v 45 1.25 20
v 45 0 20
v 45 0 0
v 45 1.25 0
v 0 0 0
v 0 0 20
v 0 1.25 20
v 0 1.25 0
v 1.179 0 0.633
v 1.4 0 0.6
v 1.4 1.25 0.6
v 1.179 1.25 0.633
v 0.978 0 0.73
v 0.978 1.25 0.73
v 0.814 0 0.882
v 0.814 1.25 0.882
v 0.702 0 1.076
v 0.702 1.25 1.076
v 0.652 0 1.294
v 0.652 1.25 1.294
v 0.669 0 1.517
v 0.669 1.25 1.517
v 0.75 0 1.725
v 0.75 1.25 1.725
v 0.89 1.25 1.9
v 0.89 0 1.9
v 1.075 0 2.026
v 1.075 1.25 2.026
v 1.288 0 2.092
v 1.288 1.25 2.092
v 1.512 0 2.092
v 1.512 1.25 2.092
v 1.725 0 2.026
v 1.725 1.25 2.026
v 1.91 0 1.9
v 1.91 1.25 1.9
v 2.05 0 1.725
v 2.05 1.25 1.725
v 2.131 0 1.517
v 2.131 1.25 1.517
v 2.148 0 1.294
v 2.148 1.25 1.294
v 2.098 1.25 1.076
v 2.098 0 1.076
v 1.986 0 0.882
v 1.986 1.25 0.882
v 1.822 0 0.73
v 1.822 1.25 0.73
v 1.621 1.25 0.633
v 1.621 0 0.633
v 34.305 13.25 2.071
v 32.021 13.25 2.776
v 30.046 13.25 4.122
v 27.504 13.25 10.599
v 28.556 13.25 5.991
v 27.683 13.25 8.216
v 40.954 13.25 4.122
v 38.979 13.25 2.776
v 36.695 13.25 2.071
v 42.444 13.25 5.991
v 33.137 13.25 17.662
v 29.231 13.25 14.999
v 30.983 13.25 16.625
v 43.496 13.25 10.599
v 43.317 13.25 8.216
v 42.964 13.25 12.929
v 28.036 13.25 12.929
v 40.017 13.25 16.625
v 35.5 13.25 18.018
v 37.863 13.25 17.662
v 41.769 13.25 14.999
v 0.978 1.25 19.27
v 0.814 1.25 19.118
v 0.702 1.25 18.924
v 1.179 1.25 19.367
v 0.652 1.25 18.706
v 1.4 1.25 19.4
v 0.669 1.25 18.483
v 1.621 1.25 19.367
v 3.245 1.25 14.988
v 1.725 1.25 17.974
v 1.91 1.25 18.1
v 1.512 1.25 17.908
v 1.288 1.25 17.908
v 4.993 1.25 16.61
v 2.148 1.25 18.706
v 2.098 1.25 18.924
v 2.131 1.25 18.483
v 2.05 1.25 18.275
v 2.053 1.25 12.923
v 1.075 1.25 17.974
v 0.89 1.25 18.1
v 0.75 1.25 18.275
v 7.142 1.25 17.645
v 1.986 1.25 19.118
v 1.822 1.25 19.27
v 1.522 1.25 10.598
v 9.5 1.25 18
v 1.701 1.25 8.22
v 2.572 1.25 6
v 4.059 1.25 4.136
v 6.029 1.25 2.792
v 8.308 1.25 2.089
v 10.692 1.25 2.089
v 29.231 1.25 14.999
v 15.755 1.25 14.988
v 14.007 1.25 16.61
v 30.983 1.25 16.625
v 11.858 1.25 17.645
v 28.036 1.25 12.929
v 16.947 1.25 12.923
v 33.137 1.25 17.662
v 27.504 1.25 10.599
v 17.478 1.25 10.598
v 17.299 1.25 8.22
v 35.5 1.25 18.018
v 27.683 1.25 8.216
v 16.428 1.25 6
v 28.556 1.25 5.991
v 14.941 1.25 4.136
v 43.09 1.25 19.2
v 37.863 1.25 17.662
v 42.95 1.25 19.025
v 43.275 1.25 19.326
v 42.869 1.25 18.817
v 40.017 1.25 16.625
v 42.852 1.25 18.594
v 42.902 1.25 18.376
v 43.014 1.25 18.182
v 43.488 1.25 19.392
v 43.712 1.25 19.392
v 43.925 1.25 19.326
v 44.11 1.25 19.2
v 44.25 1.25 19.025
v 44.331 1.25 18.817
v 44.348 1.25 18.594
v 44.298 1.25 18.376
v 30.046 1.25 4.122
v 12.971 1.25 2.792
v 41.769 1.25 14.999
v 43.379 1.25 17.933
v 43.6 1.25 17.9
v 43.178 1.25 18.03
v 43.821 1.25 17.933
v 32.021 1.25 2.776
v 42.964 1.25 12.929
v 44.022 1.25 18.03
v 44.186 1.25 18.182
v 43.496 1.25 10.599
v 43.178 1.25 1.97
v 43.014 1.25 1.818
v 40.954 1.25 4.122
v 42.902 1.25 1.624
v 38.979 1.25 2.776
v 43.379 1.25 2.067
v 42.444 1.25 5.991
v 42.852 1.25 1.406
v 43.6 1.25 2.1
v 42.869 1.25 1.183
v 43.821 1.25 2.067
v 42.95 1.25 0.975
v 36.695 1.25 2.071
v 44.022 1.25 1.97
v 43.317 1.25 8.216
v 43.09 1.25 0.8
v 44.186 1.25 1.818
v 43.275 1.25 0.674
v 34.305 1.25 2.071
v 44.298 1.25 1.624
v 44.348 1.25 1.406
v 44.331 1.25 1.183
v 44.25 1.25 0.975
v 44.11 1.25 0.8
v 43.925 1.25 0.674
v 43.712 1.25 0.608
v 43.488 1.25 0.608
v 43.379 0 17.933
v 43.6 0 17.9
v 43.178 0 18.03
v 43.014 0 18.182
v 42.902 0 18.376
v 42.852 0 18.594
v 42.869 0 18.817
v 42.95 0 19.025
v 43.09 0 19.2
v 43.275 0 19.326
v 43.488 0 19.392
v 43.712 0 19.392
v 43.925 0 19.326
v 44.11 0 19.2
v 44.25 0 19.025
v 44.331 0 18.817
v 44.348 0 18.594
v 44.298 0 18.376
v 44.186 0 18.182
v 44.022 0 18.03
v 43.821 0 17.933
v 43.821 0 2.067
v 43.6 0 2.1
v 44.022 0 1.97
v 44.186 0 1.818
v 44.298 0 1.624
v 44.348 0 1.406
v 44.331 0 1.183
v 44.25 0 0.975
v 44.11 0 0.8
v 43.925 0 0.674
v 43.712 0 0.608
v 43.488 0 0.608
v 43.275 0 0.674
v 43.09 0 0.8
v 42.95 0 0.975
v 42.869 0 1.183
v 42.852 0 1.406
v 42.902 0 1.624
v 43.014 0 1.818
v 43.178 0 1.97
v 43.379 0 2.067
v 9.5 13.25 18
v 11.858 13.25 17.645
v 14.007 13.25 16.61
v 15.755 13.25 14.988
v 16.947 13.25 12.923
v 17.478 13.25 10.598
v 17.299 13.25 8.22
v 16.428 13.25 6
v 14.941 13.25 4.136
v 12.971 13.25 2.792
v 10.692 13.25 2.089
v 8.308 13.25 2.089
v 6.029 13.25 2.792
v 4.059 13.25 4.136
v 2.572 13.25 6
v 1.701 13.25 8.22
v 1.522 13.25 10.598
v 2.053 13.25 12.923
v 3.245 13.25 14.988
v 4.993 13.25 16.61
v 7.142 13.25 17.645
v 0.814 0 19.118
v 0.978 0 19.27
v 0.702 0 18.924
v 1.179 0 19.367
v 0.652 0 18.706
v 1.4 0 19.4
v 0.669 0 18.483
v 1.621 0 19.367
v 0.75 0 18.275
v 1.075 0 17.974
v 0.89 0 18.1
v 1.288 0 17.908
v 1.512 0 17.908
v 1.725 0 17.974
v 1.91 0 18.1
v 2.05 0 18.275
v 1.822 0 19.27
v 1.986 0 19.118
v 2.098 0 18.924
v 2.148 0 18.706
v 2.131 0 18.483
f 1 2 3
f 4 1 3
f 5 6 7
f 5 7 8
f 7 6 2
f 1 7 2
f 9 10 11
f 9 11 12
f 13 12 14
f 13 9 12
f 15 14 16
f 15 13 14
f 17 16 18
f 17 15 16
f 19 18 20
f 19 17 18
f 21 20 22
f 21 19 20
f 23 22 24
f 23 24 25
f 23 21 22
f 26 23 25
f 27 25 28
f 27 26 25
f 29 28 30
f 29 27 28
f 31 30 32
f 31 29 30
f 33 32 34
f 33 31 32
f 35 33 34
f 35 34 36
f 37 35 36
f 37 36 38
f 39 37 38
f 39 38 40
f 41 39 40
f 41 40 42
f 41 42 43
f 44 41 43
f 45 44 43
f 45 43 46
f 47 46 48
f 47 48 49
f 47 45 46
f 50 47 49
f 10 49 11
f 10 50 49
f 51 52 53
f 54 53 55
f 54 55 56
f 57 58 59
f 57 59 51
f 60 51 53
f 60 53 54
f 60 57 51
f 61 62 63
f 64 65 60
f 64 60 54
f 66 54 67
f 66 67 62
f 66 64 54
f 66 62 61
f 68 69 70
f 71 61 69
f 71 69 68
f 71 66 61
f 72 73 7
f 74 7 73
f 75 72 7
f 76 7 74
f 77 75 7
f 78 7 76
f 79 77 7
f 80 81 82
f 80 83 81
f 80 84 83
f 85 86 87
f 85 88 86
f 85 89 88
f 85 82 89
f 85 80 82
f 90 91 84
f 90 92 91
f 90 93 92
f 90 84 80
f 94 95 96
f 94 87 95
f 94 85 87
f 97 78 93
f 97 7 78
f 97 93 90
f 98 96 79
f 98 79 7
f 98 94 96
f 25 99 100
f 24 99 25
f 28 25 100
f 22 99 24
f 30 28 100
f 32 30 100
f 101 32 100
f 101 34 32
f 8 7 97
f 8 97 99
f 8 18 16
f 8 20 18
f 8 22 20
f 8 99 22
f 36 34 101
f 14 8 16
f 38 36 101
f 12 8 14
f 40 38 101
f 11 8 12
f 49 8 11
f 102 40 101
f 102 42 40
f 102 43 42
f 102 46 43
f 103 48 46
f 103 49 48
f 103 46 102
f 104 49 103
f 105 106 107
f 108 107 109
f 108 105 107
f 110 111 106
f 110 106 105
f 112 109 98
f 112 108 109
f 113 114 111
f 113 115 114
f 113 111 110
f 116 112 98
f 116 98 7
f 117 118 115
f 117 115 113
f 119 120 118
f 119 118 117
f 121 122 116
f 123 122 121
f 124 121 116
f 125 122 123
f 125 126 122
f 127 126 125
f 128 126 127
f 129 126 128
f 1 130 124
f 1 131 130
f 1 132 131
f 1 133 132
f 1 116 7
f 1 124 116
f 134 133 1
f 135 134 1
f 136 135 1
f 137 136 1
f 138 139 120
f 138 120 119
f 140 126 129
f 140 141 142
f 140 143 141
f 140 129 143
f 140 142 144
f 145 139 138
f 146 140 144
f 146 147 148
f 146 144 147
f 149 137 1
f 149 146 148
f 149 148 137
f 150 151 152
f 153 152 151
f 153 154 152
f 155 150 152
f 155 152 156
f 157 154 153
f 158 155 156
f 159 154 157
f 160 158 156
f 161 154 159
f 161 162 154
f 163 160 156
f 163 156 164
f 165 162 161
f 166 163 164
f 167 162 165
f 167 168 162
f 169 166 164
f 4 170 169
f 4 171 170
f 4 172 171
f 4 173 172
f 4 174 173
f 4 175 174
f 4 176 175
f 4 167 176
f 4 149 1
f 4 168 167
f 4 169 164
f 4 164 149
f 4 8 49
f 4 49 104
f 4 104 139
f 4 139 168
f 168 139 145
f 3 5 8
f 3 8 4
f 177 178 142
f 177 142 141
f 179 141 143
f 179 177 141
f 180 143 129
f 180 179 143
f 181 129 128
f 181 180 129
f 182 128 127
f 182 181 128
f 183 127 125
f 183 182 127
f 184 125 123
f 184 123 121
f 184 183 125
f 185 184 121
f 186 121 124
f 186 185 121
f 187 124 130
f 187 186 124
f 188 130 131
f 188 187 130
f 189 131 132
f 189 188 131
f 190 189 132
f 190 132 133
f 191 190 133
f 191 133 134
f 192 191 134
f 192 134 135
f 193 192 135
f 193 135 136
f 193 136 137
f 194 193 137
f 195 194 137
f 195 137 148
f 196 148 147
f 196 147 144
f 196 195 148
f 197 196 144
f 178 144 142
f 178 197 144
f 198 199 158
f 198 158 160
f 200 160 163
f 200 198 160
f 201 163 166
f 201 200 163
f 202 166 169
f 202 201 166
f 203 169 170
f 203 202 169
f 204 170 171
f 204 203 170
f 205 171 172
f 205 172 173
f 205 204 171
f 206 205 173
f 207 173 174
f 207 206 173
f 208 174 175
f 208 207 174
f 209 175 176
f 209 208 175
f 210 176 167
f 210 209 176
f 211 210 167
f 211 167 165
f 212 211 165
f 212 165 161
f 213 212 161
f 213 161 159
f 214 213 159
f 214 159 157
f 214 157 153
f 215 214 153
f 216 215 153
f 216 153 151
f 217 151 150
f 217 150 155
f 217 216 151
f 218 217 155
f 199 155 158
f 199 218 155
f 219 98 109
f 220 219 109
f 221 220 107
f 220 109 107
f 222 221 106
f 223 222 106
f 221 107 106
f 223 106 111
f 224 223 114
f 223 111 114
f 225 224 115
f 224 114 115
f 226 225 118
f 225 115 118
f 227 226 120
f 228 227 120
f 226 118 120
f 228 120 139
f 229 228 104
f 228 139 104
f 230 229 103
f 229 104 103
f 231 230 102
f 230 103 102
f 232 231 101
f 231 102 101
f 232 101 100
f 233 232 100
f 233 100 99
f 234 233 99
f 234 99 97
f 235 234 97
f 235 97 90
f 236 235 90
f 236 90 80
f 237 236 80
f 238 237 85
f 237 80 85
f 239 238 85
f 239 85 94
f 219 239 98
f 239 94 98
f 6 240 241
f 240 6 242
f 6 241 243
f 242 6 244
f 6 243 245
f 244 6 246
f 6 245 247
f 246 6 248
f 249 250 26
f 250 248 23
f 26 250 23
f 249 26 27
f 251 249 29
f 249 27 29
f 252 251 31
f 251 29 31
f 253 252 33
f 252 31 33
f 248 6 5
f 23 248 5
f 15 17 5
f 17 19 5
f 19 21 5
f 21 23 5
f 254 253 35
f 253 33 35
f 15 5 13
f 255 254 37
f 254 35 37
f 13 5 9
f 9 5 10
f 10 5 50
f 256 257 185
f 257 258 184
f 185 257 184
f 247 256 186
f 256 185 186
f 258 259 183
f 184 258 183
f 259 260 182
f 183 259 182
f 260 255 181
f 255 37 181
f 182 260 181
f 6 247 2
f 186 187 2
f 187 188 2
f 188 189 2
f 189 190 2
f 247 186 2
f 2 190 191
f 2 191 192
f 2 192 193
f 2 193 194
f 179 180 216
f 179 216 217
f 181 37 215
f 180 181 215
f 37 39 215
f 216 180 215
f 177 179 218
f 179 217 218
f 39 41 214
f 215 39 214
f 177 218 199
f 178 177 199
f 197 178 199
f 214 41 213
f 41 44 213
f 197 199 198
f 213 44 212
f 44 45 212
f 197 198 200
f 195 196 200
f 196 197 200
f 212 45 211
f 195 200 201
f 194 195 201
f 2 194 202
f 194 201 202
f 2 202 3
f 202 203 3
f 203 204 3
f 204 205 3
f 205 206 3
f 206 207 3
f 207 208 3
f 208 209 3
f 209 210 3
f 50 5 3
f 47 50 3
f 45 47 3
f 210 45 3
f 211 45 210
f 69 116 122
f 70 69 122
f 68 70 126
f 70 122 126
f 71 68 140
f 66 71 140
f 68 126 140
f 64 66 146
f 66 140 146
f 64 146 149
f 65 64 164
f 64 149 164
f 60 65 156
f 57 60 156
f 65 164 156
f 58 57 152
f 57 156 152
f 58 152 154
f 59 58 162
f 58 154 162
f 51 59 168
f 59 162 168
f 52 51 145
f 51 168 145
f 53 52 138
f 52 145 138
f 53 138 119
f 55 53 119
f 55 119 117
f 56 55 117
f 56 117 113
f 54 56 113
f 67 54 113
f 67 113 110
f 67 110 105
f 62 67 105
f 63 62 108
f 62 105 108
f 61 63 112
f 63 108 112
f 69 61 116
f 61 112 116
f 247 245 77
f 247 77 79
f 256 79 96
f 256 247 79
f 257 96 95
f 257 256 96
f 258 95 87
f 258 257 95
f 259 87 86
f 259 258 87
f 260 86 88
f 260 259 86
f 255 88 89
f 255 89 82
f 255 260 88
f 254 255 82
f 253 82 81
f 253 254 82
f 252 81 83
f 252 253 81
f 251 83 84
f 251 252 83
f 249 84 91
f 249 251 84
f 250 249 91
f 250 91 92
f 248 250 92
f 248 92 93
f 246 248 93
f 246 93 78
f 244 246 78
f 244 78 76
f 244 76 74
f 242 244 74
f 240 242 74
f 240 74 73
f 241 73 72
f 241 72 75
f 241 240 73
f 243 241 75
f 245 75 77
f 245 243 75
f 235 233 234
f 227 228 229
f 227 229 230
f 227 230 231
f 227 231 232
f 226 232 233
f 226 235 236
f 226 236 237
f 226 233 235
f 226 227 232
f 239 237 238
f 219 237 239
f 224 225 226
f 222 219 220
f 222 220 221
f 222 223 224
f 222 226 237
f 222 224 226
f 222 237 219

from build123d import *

# Parameters (mm, degrees)
SKETCH1_W           = 45
SKETCH1_H           = 20
SKETCH1_R           = 0.75
BOSS_EXTRUDE1_DEPTH = 1.25
SKETCH3_R           = 8
BOSS_EXTRUDE2_DEPTH = 12
SKETCH4_R           = 8.018104591
BOSS_EXTRUDE3_DEPTH = 12


with BuildPart() as part:
    # Sketch1 → Boss-Extrude1 (new body)
    with BuildSketch(Plane(origin=(0, 0, 0), x_dir=(1, 0, 0), z_dir=(0, 1, 0))):
        with Locations((22.5, -10)):
            Rectangle(SKETCH1_W, SKETCH1_H)
        with Locations(Location((1.4, -18.65, 0), (0, 0, 270))):
            Circle(SKETCH1_R, mode=Mode.SUBTRACT)
        with Locations(Location((1.4, -1.35, 0), (0, 0, 90))):
            Circle(SKETCH1_R, mode=Mode.SUBTRACT)
        with Locations(Location((43.6, -18.65, 0), (0, 0, 90))):
            Circle(SKETCH1_R, mode=Mode.SUBTRACT)
        with Locations(Location((43.6, -1.35, 0), (0, 0, 270))):
            Circle(SKETCH1_R, mode=Mode.SUBTRACT)
    extrude(amount=BOSS_EXTRUDE1_DEPTH)

    # Sketch3 → Boss-Extrude2 (add)
    with BuildSketch(Plane(origin=(0, 1.25, 0), x_dir=(1, 0, 0), z_dir=(0, 1, 0))):
        with Locations(Location((9.5, -10, 0), (0, 0, 270))):
            Circle(SKETCH3_R)
    extrude(amount=BOSS_EXTRUDE2_DEPTH)

    # Sketch4 → Boss-Extrude3 (add)
    with BuildSketch(Plane(origin=(0, 1.25, 0), x_dir=(1, 0, 0), z_dir=(0, 1, 0))):
        with Locations(Location((35.5, -10, 0), (0, 0, 270))):
            Circle(SKETCH4_R)
    extrude(amount=BOSS_EXTRUDE3_DEPTH)


solid = part.part
